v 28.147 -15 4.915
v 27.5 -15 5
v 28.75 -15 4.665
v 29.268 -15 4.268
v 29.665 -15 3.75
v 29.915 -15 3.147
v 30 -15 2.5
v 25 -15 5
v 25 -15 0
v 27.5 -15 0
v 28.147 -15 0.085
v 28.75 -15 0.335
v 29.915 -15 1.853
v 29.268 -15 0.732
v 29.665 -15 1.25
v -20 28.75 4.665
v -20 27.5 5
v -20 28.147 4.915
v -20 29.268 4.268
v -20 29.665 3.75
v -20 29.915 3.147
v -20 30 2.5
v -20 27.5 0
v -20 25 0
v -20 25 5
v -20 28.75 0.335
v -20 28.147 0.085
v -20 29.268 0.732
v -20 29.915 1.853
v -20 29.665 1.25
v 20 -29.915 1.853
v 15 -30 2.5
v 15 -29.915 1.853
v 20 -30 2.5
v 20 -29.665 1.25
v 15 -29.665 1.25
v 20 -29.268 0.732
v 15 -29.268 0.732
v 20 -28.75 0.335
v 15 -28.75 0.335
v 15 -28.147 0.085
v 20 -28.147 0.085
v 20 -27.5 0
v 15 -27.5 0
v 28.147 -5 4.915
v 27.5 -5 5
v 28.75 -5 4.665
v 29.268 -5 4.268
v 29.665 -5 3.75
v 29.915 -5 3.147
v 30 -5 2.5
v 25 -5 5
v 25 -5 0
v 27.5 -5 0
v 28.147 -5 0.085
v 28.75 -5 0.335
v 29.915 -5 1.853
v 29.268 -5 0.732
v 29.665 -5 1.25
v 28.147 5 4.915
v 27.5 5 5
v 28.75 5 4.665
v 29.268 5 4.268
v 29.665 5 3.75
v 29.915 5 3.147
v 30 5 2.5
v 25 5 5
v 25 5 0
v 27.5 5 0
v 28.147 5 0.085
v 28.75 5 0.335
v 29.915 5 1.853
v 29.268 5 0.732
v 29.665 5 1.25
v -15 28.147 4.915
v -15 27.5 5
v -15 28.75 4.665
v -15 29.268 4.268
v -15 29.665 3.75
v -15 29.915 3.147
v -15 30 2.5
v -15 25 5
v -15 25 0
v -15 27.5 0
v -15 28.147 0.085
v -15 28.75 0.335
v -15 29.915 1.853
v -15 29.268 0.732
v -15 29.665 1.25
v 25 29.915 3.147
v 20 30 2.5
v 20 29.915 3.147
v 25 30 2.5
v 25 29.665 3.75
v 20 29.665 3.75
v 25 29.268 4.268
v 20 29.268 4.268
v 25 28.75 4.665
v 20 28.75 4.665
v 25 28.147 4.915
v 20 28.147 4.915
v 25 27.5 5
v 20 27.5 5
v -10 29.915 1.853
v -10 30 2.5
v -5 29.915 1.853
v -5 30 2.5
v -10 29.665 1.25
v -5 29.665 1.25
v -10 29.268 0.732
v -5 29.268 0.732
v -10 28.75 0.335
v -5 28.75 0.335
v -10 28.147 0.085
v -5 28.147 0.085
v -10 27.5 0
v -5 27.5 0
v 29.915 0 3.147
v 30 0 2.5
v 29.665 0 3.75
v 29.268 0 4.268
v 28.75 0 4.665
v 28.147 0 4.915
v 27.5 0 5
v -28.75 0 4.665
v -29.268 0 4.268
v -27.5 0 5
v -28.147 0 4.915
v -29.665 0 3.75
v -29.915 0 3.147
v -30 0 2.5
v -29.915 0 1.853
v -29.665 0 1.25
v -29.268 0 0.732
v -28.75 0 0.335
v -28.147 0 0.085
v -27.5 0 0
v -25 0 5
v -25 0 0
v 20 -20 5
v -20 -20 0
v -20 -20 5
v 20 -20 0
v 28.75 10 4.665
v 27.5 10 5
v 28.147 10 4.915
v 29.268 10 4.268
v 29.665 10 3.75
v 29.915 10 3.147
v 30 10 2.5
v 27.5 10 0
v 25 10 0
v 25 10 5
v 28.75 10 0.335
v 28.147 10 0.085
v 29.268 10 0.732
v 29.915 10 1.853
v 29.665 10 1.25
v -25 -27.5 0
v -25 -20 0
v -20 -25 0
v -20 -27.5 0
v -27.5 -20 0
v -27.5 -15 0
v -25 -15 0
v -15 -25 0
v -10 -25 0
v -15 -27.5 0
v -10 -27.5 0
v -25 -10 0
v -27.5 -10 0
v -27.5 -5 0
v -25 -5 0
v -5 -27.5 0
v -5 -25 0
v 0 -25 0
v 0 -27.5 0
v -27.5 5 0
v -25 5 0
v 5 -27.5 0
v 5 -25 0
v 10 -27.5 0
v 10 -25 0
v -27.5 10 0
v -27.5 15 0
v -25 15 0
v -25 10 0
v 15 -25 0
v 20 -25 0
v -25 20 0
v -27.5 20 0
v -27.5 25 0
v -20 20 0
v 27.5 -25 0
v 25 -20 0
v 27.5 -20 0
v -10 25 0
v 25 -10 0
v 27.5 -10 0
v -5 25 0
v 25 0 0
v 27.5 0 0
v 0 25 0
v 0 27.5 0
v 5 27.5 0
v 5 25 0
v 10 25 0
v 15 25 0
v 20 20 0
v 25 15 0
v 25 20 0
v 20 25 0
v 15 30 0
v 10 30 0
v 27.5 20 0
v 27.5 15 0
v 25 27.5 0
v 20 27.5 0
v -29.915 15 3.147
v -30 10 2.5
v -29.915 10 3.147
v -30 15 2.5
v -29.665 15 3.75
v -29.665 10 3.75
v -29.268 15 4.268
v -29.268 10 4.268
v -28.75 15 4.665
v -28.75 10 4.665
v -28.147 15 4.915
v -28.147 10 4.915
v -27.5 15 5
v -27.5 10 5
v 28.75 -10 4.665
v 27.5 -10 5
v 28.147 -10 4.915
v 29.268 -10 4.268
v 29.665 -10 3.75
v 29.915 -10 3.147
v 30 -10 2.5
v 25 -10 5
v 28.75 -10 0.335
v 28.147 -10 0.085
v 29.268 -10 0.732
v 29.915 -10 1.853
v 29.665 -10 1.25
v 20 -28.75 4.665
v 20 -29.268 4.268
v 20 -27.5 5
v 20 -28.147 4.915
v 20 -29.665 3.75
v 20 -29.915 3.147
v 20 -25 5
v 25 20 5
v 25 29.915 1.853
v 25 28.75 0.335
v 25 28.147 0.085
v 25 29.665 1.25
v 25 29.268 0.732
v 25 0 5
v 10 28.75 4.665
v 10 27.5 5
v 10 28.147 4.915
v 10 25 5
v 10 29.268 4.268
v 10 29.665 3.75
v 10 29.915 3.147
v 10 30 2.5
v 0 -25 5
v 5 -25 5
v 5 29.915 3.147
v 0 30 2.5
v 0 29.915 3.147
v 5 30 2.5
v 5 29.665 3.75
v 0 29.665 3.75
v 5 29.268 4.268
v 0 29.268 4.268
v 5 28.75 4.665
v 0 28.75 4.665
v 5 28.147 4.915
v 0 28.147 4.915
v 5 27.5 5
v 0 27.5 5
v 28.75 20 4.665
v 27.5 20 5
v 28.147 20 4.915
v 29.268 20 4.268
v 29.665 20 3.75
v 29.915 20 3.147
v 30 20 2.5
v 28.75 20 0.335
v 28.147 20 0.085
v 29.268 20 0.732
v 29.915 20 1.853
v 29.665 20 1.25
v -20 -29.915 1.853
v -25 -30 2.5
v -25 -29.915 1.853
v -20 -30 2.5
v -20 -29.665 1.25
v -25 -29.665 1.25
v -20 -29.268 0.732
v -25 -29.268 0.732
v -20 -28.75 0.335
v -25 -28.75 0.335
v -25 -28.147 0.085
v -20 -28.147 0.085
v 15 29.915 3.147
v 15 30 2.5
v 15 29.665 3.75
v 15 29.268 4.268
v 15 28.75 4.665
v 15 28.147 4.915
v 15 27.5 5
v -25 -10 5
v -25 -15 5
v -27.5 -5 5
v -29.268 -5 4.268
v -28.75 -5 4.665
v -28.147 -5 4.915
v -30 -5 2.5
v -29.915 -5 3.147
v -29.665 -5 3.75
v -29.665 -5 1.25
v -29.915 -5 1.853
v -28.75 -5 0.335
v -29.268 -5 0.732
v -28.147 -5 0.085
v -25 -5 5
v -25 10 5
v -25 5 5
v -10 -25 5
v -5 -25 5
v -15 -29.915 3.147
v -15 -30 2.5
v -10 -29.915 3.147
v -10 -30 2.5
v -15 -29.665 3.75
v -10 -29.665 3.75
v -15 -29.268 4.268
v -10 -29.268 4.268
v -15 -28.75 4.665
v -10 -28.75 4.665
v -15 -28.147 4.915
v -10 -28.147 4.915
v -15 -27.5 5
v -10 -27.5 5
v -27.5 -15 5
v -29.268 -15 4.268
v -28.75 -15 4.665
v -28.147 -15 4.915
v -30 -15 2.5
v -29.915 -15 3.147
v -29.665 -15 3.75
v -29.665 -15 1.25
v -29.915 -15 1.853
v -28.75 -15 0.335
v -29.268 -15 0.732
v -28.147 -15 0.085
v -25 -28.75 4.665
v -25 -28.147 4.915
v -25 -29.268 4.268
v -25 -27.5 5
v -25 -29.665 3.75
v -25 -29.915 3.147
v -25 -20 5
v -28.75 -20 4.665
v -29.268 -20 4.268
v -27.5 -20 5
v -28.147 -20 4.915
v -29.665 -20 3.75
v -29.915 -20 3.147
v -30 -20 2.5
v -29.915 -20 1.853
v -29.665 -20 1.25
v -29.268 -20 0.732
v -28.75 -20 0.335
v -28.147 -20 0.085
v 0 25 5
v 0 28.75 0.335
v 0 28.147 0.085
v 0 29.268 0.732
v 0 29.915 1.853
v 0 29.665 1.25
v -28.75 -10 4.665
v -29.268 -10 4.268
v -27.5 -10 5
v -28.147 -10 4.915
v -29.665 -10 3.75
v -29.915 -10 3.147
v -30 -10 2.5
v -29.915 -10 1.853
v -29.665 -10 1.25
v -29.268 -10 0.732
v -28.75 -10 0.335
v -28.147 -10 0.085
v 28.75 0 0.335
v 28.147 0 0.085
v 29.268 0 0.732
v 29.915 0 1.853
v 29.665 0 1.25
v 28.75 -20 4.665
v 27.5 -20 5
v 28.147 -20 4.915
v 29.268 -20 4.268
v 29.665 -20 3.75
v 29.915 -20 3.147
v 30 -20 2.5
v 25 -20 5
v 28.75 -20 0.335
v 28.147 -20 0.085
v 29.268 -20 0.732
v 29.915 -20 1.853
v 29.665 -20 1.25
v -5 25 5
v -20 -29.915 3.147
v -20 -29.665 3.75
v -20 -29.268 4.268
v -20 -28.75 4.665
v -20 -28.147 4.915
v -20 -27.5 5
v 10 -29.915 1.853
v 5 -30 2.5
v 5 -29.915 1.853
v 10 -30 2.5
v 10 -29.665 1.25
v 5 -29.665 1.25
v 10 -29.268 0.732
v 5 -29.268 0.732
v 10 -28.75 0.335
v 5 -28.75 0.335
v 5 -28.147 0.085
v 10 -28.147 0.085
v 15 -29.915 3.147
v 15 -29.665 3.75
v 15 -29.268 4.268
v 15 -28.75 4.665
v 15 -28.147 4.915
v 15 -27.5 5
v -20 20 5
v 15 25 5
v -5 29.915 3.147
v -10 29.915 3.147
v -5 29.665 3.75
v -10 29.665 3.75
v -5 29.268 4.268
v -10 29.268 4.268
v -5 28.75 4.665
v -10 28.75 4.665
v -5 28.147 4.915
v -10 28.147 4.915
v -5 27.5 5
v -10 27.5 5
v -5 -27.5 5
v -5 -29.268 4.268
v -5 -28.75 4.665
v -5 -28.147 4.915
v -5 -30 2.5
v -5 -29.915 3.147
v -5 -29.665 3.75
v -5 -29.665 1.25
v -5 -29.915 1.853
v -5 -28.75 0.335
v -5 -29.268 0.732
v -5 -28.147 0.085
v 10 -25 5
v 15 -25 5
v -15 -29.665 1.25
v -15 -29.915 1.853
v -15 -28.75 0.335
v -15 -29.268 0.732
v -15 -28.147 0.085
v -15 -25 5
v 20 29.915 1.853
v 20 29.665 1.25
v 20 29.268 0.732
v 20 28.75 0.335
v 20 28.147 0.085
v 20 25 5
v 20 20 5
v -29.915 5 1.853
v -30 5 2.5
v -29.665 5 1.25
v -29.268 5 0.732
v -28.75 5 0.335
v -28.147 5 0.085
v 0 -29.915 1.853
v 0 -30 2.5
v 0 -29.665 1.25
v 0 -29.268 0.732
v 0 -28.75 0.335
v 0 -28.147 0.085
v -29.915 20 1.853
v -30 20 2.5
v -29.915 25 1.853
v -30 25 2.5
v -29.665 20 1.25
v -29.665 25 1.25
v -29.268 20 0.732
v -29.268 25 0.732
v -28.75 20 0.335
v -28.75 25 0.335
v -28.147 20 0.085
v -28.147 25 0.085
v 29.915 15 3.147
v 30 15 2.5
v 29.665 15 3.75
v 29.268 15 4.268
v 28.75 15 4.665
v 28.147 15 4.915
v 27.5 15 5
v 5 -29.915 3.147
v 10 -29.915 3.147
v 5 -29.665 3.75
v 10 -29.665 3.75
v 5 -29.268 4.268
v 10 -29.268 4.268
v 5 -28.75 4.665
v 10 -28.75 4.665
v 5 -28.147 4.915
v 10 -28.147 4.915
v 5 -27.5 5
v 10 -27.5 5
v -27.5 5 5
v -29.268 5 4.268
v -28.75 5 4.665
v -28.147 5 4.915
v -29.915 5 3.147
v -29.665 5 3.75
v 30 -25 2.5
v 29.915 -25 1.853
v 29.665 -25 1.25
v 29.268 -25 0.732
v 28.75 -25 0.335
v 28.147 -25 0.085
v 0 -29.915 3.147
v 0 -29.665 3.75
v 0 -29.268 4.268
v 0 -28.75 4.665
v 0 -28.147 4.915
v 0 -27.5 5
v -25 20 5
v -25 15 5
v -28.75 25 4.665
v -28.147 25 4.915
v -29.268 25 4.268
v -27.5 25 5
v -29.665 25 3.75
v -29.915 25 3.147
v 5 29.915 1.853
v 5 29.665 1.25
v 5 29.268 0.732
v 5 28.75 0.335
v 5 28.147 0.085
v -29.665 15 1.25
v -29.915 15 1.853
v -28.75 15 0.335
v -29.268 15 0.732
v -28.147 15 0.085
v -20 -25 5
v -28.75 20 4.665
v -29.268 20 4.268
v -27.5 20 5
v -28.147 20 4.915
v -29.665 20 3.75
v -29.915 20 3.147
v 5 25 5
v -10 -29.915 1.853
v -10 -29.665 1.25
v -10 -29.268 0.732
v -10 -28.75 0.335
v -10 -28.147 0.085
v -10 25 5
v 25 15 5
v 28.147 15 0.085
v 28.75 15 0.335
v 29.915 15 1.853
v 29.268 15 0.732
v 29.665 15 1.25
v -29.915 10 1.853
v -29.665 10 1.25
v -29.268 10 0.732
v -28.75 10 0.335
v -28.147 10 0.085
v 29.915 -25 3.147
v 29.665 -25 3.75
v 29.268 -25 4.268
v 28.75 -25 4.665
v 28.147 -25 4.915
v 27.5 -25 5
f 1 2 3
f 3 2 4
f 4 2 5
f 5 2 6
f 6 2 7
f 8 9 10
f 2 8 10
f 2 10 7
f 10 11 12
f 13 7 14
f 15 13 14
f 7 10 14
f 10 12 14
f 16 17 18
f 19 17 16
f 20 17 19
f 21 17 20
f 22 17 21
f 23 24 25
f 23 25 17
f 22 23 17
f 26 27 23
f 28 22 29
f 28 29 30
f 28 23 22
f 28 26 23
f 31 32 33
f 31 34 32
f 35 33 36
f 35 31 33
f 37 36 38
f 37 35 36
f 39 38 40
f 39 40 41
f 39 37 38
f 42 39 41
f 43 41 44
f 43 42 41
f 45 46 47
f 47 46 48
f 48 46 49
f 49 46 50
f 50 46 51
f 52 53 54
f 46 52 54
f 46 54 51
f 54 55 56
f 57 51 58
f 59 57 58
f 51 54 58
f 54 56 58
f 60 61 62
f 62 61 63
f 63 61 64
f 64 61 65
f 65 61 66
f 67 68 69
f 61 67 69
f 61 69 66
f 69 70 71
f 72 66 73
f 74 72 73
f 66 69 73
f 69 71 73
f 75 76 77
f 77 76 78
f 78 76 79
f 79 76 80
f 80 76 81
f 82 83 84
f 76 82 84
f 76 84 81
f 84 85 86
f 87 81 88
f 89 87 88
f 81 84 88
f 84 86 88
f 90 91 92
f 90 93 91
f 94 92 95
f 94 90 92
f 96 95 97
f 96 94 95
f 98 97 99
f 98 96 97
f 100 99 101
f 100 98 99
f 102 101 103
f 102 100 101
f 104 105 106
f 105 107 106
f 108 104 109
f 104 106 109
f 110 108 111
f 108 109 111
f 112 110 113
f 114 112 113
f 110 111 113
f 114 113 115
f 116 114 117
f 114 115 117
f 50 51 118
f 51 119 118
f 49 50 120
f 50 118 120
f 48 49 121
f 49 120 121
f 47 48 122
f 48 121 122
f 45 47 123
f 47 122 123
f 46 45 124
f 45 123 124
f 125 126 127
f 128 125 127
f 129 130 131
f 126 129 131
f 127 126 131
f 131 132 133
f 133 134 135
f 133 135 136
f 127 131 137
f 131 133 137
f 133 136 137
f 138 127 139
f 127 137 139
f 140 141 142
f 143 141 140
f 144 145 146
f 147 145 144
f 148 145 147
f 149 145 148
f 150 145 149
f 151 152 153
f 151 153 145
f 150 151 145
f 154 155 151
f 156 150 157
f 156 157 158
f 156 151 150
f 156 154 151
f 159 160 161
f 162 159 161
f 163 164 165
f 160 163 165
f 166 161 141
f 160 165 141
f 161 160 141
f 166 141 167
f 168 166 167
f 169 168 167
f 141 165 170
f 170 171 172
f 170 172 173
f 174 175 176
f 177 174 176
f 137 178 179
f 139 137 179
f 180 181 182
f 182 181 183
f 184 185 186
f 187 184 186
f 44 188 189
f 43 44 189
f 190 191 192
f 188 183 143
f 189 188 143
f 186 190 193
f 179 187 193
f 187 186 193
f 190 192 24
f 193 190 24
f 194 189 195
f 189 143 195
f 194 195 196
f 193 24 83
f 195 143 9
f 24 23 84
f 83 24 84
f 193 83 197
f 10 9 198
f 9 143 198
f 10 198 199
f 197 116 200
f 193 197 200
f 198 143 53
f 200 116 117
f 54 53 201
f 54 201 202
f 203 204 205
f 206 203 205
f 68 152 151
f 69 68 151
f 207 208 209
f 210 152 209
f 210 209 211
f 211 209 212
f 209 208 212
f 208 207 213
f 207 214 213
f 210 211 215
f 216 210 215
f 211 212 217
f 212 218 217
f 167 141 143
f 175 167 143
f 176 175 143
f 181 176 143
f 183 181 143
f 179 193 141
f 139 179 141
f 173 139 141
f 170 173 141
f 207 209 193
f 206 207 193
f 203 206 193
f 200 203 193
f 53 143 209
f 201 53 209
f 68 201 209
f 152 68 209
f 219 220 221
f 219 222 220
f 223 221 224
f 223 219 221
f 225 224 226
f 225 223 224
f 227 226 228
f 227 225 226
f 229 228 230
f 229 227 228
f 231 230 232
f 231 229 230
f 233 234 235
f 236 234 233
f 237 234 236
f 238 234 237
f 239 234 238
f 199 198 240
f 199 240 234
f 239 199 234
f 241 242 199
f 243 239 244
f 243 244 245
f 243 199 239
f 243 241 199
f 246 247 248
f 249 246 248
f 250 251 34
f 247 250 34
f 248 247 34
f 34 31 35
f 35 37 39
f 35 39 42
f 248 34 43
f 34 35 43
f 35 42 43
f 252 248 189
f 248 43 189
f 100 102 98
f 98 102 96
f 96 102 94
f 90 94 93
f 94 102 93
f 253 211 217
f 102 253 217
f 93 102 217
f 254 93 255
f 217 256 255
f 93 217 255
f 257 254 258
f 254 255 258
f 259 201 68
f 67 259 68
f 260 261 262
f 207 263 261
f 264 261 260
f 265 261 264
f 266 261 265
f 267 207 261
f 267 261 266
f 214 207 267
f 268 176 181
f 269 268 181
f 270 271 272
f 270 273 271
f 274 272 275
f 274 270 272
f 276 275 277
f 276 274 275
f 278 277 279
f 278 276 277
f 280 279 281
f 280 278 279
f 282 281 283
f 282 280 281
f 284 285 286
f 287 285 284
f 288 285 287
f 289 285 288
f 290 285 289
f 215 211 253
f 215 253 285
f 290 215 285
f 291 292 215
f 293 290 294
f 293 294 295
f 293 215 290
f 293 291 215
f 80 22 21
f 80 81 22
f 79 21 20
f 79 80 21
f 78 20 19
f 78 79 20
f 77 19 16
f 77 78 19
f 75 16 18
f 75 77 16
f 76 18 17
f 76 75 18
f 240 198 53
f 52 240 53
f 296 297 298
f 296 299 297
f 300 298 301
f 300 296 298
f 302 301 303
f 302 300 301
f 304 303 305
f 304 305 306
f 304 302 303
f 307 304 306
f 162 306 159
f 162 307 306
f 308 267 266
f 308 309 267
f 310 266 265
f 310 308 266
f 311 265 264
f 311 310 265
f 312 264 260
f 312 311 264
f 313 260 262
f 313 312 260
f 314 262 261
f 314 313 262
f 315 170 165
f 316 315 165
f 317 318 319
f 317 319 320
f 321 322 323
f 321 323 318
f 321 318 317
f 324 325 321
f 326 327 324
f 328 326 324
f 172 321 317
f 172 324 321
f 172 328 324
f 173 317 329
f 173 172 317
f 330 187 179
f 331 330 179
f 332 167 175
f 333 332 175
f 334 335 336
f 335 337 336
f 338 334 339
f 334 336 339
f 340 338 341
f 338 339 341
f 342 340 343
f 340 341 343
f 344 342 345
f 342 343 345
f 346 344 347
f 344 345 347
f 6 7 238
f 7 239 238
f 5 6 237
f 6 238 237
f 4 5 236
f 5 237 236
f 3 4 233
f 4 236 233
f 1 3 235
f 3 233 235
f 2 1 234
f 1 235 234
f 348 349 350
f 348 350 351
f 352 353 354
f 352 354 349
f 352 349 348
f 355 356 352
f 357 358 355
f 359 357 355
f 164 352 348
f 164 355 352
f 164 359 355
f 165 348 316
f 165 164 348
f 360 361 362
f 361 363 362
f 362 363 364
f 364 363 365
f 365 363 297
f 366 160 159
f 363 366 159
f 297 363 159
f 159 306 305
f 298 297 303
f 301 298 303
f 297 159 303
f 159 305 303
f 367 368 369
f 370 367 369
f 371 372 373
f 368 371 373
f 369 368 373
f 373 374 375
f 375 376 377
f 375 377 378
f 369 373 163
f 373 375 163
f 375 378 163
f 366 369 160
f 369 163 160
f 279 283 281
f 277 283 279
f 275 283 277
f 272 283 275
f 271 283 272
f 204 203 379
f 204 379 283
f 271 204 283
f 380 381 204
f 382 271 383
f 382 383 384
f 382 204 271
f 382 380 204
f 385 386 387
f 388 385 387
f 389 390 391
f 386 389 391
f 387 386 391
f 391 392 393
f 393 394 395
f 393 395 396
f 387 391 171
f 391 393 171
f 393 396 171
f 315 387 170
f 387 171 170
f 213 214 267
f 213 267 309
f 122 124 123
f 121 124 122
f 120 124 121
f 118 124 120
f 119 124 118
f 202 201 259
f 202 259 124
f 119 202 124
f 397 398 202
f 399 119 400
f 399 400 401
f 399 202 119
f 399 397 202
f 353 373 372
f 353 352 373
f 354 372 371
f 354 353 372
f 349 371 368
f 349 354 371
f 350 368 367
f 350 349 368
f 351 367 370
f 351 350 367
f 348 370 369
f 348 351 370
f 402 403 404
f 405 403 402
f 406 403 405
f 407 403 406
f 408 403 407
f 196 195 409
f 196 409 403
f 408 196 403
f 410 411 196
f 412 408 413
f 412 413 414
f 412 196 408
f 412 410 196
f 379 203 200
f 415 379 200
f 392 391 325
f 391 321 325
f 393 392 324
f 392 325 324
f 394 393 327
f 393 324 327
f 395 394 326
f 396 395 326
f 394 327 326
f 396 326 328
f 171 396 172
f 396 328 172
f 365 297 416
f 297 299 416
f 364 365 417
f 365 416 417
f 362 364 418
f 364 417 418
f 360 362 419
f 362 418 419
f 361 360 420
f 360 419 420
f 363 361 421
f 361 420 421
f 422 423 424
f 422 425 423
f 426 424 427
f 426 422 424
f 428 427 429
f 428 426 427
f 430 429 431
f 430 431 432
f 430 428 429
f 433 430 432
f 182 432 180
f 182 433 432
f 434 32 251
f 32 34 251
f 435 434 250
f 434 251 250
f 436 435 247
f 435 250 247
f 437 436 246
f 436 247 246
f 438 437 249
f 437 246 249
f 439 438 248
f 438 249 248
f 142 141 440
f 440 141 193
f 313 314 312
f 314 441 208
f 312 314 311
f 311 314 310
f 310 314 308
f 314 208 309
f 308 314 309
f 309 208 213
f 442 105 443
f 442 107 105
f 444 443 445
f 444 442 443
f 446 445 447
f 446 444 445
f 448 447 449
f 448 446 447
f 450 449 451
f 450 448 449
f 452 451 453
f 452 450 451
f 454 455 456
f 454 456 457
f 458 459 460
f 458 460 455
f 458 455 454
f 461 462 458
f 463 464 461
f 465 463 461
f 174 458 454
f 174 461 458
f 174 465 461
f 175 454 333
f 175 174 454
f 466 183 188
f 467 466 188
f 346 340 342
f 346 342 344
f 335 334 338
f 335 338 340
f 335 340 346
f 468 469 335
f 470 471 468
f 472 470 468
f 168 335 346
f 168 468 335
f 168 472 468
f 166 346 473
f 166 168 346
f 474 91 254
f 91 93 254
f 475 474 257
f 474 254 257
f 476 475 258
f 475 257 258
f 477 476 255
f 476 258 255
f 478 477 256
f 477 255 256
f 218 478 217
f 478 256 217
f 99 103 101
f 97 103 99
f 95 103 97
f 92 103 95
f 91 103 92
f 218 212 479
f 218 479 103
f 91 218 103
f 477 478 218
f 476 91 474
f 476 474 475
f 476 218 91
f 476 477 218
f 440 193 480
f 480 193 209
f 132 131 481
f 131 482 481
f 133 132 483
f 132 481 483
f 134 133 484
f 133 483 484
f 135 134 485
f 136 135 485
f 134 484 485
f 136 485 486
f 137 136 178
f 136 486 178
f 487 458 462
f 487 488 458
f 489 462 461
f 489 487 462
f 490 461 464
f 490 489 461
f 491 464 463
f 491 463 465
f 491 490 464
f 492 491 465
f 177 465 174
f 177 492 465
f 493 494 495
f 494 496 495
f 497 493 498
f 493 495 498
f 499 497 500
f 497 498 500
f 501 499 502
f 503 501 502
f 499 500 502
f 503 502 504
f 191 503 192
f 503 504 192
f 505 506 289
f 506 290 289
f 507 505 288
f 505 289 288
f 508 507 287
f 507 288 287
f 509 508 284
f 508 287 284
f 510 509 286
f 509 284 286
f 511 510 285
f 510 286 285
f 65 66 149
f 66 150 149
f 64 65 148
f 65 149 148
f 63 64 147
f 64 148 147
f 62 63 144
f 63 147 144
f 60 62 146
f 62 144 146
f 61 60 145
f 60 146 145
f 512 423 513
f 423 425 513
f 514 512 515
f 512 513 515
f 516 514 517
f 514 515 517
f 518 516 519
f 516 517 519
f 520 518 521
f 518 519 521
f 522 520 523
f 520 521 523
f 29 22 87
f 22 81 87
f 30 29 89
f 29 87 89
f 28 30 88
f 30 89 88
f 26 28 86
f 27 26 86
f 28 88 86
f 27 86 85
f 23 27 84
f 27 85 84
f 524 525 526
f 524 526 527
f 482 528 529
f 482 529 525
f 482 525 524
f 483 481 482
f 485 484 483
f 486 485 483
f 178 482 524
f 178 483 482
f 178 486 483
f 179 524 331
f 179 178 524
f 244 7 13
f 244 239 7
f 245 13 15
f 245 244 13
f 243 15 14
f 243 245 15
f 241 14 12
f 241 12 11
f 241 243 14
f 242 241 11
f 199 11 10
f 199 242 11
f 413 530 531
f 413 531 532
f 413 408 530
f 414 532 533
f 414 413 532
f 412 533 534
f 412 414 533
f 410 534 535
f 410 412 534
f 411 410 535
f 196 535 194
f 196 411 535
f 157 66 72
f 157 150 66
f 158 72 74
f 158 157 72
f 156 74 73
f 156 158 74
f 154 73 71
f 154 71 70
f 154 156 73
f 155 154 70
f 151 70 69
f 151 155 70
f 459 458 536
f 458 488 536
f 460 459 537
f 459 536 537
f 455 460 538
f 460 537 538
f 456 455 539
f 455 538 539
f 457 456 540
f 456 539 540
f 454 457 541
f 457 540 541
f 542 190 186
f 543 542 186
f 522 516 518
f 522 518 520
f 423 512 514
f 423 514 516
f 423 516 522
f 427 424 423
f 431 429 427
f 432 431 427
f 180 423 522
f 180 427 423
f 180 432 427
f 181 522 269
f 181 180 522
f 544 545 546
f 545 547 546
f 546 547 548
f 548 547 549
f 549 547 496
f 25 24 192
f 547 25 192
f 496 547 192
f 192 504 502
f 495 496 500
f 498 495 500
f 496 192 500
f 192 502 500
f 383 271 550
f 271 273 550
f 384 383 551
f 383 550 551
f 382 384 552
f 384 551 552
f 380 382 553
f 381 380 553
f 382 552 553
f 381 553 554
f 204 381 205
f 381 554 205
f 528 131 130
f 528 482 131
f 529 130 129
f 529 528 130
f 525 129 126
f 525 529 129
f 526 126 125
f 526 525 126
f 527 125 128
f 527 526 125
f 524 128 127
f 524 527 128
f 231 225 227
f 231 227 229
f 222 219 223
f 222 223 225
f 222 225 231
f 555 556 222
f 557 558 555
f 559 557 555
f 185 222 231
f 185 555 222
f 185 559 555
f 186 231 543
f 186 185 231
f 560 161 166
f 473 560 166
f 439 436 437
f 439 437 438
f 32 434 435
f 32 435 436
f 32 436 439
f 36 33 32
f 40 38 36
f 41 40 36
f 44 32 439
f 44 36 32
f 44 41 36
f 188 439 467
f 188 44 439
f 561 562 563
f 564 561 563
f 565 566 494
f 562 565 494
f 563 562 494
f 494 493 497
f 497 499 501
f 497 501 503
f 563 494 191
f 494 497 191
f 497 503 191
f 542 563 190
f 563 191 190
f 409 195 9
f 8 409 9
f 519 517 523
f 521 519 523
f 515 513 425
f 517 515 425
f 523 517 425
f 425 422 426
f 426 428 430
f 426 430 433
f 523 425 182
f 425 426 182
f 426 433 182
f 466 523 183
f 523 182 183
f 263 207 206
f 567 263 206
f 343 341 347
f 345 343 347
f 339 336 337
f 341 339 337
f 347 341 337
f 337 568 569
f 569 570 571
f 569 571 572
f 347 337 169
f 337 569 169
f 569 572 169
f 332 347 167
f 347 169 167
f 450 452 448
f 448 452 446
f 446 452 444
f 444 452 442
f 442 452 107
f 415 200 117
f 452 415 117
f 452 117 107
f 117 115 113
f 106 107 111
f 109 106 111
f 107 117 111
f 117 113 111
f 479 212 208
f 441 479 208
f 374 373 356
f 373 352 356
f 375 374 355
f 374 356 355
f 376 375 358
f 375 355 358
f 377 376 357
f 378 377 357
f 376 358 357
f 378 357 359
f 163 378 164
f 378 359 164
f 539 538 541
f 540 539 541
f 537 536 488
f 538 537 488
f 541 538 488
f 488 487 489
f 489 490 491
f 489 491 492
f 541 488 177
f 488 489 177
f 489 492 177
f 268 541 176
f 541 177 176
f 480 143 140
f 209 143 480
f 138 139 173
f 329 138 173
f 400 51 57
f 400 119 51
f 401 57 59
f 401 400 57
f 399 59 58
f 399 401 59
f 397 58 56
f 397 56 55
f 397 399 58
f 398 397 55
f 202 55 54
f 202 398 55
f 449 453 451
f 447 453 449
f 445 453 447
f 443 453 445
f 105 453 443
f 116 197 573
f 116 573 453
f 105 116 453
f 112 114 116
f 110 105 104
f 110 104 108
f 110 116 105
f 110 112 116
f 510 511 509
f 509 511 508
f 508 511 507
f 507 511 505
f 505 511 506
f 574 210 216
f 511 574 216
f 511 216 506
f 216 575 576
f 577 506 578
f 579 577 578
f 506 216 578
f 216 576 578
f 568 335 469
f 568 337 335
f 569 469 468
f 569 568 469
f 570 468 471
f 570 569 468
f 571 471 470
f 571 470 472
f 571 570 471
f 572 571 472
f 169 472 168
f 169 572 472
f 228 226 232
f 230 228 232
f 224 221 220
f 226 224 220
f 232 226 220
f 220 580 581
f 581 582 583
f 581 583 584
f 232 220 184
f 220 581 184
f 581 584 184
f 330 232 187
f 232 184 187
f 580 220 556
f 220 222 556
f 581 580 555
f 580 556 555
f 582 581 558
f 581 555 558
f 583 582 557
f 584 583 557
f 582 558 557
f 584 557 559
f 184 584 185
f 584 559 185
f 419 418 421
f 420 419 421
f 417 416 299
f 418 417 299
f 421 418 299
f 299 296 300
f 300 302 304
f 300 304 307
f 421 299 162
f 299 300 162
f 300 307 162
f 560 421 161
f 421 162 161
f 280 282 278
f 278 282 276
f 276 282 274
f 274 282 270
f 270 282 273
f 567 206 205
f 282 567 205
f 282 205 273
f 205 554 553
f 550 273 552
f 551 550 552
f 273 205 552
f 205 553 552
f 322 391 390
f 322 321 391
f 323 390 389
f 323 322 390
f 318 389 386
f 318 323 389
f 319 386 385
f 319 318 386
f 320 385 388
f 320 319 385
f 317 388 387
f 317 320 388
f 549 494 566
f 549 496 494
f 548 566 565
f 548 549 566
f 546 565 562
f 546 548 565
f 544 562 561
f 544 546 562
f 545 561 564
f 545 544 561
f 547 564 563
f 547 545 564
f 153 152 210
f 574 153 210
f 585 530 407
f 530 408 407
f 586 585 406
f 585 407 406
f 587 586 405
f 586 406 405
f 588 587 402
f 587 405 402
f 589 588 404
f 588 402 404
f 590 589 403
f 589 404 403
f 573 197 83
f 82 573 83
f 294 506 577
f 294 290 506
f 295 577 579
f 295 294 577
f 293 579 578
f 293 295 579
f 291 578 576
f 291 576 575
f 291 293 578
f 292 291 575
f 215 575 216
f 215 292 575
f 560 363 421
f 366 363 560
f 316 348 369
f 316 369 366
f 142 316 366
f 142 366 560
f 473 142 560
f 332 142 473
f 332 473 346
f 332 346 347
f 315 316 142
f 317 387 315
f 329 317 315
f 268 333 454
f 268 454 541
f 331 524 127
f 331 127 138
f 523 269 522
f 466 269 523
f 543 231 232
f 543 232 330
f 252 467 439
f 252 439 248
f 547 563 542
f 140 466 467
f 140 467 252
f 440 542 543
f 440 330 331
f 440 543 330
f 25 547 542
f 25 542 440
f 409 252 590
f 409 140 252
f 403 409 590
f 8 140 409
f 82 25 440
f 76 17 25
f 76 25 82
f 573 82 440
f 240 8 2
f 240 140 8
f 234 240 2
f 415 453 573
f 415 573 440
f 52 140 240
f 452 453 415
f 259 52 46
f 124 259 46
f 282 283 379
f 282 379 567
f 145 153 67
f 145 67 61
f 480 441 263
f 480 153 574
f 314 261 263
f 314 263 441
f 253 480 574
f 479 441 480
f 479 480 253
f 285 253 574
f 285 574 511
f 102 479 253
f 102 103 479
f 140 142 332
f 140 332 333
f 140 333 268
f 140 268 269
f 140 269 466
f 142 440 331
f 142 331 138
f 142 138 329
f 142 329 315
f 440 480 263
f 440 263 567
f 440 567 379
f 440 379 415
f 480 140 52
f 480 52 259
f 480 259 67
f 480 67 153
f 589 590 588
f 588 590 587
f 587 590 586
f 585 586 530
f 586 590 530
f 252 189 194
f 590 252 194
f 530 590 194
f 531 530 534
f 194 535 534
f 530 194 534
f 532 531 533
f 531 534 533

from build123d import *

# Parameters (mm, degrees)
F0_W     = 40
F0_H     = 40
F0_W_2   = 5
F0_H_2   = 5
F1_DEPTH = 5
F2_R     = 2.49999


# Not quite as in the source:
# - a fillet or chamfer is up to 0.001 mm smaller than in the source, because OpenCascade refuses the exact size


with BuildPart() as f1:
    # F0 (on Top) → F1 (new body)
    with BuildSketch(Plane.XY):
        Polygon((25, 20), (25, 25), (20, 25), (15, 25), (10, 25), (5, 25), (0, 25), (-5, 25), (-10, 25), (-15, 25), (-20, 25), (-25, 25), (-25, 20), (-25, 15), (-25, 10), (-25, 5), (-25, 0), (-25, -5), (-25, -10), (-25, -15), (-25, -20), (-25, -25), (-20, -25), (-15, -25), (-10, -25), (-5, -25), (0, -25), (5, -25), (10, -25), (15, -25), (20, -25), (25, -25), (25, -20), (25, -15), (25, -10), (25, -5), (25, 0), (25, 5), (25, 10), (25, 15), align=None)
        Rectangle(F0_W, F0_H, mode=Mode.SUBTRACT)
        with Locations((22.5, 27.5)):
            Rectangle(F0_W_2, F0_H_2)
        with Locations((27.5, 17.5)):
            Rectangle(F0_W_2, F0_H_2)
        with Locations((12.5, 27.5)):
            Rectangle(F0_W_2, F0_H_2)
        with Locations((27.5, 7.5)):
            Rectangle(F0_W_2, F0_H_2)
        with Locations((2.5, 27.5)):
            Rectangle(F0_W_2, F0_H_2)
        with Locations((27.5, -2.5)):
            Rectangle(F0_W_2, F0_H_2)
        with Locations((-7.5, 27.5)):
            Rectangle(F0_W_2, F0_H_2)
        with Locations((27.5, -12.5)):
            Rectangle(F0_W_2, F0_H_2)
        with Locations((-17.5, 27.5)):
            Rectangle(F0_W_2, F0_H_2)
        with Locations((27.5, -22.5)):
            Rectangle(F0_W_2, F0_H_2)
        with Locations((-27.5, 22.5)):
            Rectangle(F0_W_2, F0_H_2)
        with Locations((17.5, -27.5)):
            Rectangle(F0_W_2, F0_H_2)
        with Locations((-27.5, 12.5)):
            Rectangle(F0_W_2, F0_H_2)
        with Locations((7.5, -27.5)):
            Rectangle(F0_W_2, F0_H_2)
        with Locations((-27.5, 2.5)):
            Rectangle(F0_W_2, F0_H_2)
        with Locations((-2.5, -27.5)):
            Rectangle(F0_W_2, F0_H_2)
        with Locations((-27.5, -7.5)):
            Rectangle(F0_W_2, F0_H_2)
        with Locations((-12.5, -27.5)):
            Rectangle(F0_W_2, F0_H_2)
        with Locations((-27.5, -17.5)):
            Rectangle(F0_W_2, F0_H_2)
        with Locations((-22.5, -27.5)):
            Rectangle(F0_W_2, F0_H_2)
    extrude(amount=F1_DEPTH)

    # F2 (radius 2.5 in the source; OpenCascade refuses exactly that, so slightly less here)
    f2_edges = [f1.edges().sort_by_distance(p)[0] for p in [
        (-30, 22.5, 5),
        (-30, 22.5, 0),
        (-30, 12.5, 5),
        (-30, 12.5, 0),
        (-30, 2.5, 0),
        (-30, 2.5, 5),
        (-30, -7.5, 0),
        (-30, -7.5, 5),
        (-30, -17.5, 5),
        (-30, -17.5, 0),
        (-22.5, -30, 5),
        (-22.5, -30, 0),
        (-12.5, -30, 5),
        (-12.5, -30, 0),
        (-2.5, -30, 0),
        (-2.5, -30, 5),
        (7.5, -30, 5),
        (7.5, -30, 0),
        (17.5, -30, 0),
        (17.5, -30, 5),
        (30, -22.5, 5),
        (30, -22.5, 0),
        (30, -12.5, 5),
        (30, -12.5, 0),
        (30, -2.5, 5),
        (30, -2.5, 0),
        (30, 7.5, 5),
        (30, 7.5, 0),
        (30, 17.5, 5),
        (30, 17.5, 0),
        (22.5, 30, 5),
        (22.5, 30, 0),
        (12.5, 30, 5),
        (2.5, 30, 5),
        (2.5, 30, 0),
        (-7.5, 30, 5),
        (-7.5, 30, 0),
        (-17.5, 30, 5),
        (-17.5, 30, 0),
    ]]
    fillet(f2_edges, radius=F2_R)


solid = f1.part
